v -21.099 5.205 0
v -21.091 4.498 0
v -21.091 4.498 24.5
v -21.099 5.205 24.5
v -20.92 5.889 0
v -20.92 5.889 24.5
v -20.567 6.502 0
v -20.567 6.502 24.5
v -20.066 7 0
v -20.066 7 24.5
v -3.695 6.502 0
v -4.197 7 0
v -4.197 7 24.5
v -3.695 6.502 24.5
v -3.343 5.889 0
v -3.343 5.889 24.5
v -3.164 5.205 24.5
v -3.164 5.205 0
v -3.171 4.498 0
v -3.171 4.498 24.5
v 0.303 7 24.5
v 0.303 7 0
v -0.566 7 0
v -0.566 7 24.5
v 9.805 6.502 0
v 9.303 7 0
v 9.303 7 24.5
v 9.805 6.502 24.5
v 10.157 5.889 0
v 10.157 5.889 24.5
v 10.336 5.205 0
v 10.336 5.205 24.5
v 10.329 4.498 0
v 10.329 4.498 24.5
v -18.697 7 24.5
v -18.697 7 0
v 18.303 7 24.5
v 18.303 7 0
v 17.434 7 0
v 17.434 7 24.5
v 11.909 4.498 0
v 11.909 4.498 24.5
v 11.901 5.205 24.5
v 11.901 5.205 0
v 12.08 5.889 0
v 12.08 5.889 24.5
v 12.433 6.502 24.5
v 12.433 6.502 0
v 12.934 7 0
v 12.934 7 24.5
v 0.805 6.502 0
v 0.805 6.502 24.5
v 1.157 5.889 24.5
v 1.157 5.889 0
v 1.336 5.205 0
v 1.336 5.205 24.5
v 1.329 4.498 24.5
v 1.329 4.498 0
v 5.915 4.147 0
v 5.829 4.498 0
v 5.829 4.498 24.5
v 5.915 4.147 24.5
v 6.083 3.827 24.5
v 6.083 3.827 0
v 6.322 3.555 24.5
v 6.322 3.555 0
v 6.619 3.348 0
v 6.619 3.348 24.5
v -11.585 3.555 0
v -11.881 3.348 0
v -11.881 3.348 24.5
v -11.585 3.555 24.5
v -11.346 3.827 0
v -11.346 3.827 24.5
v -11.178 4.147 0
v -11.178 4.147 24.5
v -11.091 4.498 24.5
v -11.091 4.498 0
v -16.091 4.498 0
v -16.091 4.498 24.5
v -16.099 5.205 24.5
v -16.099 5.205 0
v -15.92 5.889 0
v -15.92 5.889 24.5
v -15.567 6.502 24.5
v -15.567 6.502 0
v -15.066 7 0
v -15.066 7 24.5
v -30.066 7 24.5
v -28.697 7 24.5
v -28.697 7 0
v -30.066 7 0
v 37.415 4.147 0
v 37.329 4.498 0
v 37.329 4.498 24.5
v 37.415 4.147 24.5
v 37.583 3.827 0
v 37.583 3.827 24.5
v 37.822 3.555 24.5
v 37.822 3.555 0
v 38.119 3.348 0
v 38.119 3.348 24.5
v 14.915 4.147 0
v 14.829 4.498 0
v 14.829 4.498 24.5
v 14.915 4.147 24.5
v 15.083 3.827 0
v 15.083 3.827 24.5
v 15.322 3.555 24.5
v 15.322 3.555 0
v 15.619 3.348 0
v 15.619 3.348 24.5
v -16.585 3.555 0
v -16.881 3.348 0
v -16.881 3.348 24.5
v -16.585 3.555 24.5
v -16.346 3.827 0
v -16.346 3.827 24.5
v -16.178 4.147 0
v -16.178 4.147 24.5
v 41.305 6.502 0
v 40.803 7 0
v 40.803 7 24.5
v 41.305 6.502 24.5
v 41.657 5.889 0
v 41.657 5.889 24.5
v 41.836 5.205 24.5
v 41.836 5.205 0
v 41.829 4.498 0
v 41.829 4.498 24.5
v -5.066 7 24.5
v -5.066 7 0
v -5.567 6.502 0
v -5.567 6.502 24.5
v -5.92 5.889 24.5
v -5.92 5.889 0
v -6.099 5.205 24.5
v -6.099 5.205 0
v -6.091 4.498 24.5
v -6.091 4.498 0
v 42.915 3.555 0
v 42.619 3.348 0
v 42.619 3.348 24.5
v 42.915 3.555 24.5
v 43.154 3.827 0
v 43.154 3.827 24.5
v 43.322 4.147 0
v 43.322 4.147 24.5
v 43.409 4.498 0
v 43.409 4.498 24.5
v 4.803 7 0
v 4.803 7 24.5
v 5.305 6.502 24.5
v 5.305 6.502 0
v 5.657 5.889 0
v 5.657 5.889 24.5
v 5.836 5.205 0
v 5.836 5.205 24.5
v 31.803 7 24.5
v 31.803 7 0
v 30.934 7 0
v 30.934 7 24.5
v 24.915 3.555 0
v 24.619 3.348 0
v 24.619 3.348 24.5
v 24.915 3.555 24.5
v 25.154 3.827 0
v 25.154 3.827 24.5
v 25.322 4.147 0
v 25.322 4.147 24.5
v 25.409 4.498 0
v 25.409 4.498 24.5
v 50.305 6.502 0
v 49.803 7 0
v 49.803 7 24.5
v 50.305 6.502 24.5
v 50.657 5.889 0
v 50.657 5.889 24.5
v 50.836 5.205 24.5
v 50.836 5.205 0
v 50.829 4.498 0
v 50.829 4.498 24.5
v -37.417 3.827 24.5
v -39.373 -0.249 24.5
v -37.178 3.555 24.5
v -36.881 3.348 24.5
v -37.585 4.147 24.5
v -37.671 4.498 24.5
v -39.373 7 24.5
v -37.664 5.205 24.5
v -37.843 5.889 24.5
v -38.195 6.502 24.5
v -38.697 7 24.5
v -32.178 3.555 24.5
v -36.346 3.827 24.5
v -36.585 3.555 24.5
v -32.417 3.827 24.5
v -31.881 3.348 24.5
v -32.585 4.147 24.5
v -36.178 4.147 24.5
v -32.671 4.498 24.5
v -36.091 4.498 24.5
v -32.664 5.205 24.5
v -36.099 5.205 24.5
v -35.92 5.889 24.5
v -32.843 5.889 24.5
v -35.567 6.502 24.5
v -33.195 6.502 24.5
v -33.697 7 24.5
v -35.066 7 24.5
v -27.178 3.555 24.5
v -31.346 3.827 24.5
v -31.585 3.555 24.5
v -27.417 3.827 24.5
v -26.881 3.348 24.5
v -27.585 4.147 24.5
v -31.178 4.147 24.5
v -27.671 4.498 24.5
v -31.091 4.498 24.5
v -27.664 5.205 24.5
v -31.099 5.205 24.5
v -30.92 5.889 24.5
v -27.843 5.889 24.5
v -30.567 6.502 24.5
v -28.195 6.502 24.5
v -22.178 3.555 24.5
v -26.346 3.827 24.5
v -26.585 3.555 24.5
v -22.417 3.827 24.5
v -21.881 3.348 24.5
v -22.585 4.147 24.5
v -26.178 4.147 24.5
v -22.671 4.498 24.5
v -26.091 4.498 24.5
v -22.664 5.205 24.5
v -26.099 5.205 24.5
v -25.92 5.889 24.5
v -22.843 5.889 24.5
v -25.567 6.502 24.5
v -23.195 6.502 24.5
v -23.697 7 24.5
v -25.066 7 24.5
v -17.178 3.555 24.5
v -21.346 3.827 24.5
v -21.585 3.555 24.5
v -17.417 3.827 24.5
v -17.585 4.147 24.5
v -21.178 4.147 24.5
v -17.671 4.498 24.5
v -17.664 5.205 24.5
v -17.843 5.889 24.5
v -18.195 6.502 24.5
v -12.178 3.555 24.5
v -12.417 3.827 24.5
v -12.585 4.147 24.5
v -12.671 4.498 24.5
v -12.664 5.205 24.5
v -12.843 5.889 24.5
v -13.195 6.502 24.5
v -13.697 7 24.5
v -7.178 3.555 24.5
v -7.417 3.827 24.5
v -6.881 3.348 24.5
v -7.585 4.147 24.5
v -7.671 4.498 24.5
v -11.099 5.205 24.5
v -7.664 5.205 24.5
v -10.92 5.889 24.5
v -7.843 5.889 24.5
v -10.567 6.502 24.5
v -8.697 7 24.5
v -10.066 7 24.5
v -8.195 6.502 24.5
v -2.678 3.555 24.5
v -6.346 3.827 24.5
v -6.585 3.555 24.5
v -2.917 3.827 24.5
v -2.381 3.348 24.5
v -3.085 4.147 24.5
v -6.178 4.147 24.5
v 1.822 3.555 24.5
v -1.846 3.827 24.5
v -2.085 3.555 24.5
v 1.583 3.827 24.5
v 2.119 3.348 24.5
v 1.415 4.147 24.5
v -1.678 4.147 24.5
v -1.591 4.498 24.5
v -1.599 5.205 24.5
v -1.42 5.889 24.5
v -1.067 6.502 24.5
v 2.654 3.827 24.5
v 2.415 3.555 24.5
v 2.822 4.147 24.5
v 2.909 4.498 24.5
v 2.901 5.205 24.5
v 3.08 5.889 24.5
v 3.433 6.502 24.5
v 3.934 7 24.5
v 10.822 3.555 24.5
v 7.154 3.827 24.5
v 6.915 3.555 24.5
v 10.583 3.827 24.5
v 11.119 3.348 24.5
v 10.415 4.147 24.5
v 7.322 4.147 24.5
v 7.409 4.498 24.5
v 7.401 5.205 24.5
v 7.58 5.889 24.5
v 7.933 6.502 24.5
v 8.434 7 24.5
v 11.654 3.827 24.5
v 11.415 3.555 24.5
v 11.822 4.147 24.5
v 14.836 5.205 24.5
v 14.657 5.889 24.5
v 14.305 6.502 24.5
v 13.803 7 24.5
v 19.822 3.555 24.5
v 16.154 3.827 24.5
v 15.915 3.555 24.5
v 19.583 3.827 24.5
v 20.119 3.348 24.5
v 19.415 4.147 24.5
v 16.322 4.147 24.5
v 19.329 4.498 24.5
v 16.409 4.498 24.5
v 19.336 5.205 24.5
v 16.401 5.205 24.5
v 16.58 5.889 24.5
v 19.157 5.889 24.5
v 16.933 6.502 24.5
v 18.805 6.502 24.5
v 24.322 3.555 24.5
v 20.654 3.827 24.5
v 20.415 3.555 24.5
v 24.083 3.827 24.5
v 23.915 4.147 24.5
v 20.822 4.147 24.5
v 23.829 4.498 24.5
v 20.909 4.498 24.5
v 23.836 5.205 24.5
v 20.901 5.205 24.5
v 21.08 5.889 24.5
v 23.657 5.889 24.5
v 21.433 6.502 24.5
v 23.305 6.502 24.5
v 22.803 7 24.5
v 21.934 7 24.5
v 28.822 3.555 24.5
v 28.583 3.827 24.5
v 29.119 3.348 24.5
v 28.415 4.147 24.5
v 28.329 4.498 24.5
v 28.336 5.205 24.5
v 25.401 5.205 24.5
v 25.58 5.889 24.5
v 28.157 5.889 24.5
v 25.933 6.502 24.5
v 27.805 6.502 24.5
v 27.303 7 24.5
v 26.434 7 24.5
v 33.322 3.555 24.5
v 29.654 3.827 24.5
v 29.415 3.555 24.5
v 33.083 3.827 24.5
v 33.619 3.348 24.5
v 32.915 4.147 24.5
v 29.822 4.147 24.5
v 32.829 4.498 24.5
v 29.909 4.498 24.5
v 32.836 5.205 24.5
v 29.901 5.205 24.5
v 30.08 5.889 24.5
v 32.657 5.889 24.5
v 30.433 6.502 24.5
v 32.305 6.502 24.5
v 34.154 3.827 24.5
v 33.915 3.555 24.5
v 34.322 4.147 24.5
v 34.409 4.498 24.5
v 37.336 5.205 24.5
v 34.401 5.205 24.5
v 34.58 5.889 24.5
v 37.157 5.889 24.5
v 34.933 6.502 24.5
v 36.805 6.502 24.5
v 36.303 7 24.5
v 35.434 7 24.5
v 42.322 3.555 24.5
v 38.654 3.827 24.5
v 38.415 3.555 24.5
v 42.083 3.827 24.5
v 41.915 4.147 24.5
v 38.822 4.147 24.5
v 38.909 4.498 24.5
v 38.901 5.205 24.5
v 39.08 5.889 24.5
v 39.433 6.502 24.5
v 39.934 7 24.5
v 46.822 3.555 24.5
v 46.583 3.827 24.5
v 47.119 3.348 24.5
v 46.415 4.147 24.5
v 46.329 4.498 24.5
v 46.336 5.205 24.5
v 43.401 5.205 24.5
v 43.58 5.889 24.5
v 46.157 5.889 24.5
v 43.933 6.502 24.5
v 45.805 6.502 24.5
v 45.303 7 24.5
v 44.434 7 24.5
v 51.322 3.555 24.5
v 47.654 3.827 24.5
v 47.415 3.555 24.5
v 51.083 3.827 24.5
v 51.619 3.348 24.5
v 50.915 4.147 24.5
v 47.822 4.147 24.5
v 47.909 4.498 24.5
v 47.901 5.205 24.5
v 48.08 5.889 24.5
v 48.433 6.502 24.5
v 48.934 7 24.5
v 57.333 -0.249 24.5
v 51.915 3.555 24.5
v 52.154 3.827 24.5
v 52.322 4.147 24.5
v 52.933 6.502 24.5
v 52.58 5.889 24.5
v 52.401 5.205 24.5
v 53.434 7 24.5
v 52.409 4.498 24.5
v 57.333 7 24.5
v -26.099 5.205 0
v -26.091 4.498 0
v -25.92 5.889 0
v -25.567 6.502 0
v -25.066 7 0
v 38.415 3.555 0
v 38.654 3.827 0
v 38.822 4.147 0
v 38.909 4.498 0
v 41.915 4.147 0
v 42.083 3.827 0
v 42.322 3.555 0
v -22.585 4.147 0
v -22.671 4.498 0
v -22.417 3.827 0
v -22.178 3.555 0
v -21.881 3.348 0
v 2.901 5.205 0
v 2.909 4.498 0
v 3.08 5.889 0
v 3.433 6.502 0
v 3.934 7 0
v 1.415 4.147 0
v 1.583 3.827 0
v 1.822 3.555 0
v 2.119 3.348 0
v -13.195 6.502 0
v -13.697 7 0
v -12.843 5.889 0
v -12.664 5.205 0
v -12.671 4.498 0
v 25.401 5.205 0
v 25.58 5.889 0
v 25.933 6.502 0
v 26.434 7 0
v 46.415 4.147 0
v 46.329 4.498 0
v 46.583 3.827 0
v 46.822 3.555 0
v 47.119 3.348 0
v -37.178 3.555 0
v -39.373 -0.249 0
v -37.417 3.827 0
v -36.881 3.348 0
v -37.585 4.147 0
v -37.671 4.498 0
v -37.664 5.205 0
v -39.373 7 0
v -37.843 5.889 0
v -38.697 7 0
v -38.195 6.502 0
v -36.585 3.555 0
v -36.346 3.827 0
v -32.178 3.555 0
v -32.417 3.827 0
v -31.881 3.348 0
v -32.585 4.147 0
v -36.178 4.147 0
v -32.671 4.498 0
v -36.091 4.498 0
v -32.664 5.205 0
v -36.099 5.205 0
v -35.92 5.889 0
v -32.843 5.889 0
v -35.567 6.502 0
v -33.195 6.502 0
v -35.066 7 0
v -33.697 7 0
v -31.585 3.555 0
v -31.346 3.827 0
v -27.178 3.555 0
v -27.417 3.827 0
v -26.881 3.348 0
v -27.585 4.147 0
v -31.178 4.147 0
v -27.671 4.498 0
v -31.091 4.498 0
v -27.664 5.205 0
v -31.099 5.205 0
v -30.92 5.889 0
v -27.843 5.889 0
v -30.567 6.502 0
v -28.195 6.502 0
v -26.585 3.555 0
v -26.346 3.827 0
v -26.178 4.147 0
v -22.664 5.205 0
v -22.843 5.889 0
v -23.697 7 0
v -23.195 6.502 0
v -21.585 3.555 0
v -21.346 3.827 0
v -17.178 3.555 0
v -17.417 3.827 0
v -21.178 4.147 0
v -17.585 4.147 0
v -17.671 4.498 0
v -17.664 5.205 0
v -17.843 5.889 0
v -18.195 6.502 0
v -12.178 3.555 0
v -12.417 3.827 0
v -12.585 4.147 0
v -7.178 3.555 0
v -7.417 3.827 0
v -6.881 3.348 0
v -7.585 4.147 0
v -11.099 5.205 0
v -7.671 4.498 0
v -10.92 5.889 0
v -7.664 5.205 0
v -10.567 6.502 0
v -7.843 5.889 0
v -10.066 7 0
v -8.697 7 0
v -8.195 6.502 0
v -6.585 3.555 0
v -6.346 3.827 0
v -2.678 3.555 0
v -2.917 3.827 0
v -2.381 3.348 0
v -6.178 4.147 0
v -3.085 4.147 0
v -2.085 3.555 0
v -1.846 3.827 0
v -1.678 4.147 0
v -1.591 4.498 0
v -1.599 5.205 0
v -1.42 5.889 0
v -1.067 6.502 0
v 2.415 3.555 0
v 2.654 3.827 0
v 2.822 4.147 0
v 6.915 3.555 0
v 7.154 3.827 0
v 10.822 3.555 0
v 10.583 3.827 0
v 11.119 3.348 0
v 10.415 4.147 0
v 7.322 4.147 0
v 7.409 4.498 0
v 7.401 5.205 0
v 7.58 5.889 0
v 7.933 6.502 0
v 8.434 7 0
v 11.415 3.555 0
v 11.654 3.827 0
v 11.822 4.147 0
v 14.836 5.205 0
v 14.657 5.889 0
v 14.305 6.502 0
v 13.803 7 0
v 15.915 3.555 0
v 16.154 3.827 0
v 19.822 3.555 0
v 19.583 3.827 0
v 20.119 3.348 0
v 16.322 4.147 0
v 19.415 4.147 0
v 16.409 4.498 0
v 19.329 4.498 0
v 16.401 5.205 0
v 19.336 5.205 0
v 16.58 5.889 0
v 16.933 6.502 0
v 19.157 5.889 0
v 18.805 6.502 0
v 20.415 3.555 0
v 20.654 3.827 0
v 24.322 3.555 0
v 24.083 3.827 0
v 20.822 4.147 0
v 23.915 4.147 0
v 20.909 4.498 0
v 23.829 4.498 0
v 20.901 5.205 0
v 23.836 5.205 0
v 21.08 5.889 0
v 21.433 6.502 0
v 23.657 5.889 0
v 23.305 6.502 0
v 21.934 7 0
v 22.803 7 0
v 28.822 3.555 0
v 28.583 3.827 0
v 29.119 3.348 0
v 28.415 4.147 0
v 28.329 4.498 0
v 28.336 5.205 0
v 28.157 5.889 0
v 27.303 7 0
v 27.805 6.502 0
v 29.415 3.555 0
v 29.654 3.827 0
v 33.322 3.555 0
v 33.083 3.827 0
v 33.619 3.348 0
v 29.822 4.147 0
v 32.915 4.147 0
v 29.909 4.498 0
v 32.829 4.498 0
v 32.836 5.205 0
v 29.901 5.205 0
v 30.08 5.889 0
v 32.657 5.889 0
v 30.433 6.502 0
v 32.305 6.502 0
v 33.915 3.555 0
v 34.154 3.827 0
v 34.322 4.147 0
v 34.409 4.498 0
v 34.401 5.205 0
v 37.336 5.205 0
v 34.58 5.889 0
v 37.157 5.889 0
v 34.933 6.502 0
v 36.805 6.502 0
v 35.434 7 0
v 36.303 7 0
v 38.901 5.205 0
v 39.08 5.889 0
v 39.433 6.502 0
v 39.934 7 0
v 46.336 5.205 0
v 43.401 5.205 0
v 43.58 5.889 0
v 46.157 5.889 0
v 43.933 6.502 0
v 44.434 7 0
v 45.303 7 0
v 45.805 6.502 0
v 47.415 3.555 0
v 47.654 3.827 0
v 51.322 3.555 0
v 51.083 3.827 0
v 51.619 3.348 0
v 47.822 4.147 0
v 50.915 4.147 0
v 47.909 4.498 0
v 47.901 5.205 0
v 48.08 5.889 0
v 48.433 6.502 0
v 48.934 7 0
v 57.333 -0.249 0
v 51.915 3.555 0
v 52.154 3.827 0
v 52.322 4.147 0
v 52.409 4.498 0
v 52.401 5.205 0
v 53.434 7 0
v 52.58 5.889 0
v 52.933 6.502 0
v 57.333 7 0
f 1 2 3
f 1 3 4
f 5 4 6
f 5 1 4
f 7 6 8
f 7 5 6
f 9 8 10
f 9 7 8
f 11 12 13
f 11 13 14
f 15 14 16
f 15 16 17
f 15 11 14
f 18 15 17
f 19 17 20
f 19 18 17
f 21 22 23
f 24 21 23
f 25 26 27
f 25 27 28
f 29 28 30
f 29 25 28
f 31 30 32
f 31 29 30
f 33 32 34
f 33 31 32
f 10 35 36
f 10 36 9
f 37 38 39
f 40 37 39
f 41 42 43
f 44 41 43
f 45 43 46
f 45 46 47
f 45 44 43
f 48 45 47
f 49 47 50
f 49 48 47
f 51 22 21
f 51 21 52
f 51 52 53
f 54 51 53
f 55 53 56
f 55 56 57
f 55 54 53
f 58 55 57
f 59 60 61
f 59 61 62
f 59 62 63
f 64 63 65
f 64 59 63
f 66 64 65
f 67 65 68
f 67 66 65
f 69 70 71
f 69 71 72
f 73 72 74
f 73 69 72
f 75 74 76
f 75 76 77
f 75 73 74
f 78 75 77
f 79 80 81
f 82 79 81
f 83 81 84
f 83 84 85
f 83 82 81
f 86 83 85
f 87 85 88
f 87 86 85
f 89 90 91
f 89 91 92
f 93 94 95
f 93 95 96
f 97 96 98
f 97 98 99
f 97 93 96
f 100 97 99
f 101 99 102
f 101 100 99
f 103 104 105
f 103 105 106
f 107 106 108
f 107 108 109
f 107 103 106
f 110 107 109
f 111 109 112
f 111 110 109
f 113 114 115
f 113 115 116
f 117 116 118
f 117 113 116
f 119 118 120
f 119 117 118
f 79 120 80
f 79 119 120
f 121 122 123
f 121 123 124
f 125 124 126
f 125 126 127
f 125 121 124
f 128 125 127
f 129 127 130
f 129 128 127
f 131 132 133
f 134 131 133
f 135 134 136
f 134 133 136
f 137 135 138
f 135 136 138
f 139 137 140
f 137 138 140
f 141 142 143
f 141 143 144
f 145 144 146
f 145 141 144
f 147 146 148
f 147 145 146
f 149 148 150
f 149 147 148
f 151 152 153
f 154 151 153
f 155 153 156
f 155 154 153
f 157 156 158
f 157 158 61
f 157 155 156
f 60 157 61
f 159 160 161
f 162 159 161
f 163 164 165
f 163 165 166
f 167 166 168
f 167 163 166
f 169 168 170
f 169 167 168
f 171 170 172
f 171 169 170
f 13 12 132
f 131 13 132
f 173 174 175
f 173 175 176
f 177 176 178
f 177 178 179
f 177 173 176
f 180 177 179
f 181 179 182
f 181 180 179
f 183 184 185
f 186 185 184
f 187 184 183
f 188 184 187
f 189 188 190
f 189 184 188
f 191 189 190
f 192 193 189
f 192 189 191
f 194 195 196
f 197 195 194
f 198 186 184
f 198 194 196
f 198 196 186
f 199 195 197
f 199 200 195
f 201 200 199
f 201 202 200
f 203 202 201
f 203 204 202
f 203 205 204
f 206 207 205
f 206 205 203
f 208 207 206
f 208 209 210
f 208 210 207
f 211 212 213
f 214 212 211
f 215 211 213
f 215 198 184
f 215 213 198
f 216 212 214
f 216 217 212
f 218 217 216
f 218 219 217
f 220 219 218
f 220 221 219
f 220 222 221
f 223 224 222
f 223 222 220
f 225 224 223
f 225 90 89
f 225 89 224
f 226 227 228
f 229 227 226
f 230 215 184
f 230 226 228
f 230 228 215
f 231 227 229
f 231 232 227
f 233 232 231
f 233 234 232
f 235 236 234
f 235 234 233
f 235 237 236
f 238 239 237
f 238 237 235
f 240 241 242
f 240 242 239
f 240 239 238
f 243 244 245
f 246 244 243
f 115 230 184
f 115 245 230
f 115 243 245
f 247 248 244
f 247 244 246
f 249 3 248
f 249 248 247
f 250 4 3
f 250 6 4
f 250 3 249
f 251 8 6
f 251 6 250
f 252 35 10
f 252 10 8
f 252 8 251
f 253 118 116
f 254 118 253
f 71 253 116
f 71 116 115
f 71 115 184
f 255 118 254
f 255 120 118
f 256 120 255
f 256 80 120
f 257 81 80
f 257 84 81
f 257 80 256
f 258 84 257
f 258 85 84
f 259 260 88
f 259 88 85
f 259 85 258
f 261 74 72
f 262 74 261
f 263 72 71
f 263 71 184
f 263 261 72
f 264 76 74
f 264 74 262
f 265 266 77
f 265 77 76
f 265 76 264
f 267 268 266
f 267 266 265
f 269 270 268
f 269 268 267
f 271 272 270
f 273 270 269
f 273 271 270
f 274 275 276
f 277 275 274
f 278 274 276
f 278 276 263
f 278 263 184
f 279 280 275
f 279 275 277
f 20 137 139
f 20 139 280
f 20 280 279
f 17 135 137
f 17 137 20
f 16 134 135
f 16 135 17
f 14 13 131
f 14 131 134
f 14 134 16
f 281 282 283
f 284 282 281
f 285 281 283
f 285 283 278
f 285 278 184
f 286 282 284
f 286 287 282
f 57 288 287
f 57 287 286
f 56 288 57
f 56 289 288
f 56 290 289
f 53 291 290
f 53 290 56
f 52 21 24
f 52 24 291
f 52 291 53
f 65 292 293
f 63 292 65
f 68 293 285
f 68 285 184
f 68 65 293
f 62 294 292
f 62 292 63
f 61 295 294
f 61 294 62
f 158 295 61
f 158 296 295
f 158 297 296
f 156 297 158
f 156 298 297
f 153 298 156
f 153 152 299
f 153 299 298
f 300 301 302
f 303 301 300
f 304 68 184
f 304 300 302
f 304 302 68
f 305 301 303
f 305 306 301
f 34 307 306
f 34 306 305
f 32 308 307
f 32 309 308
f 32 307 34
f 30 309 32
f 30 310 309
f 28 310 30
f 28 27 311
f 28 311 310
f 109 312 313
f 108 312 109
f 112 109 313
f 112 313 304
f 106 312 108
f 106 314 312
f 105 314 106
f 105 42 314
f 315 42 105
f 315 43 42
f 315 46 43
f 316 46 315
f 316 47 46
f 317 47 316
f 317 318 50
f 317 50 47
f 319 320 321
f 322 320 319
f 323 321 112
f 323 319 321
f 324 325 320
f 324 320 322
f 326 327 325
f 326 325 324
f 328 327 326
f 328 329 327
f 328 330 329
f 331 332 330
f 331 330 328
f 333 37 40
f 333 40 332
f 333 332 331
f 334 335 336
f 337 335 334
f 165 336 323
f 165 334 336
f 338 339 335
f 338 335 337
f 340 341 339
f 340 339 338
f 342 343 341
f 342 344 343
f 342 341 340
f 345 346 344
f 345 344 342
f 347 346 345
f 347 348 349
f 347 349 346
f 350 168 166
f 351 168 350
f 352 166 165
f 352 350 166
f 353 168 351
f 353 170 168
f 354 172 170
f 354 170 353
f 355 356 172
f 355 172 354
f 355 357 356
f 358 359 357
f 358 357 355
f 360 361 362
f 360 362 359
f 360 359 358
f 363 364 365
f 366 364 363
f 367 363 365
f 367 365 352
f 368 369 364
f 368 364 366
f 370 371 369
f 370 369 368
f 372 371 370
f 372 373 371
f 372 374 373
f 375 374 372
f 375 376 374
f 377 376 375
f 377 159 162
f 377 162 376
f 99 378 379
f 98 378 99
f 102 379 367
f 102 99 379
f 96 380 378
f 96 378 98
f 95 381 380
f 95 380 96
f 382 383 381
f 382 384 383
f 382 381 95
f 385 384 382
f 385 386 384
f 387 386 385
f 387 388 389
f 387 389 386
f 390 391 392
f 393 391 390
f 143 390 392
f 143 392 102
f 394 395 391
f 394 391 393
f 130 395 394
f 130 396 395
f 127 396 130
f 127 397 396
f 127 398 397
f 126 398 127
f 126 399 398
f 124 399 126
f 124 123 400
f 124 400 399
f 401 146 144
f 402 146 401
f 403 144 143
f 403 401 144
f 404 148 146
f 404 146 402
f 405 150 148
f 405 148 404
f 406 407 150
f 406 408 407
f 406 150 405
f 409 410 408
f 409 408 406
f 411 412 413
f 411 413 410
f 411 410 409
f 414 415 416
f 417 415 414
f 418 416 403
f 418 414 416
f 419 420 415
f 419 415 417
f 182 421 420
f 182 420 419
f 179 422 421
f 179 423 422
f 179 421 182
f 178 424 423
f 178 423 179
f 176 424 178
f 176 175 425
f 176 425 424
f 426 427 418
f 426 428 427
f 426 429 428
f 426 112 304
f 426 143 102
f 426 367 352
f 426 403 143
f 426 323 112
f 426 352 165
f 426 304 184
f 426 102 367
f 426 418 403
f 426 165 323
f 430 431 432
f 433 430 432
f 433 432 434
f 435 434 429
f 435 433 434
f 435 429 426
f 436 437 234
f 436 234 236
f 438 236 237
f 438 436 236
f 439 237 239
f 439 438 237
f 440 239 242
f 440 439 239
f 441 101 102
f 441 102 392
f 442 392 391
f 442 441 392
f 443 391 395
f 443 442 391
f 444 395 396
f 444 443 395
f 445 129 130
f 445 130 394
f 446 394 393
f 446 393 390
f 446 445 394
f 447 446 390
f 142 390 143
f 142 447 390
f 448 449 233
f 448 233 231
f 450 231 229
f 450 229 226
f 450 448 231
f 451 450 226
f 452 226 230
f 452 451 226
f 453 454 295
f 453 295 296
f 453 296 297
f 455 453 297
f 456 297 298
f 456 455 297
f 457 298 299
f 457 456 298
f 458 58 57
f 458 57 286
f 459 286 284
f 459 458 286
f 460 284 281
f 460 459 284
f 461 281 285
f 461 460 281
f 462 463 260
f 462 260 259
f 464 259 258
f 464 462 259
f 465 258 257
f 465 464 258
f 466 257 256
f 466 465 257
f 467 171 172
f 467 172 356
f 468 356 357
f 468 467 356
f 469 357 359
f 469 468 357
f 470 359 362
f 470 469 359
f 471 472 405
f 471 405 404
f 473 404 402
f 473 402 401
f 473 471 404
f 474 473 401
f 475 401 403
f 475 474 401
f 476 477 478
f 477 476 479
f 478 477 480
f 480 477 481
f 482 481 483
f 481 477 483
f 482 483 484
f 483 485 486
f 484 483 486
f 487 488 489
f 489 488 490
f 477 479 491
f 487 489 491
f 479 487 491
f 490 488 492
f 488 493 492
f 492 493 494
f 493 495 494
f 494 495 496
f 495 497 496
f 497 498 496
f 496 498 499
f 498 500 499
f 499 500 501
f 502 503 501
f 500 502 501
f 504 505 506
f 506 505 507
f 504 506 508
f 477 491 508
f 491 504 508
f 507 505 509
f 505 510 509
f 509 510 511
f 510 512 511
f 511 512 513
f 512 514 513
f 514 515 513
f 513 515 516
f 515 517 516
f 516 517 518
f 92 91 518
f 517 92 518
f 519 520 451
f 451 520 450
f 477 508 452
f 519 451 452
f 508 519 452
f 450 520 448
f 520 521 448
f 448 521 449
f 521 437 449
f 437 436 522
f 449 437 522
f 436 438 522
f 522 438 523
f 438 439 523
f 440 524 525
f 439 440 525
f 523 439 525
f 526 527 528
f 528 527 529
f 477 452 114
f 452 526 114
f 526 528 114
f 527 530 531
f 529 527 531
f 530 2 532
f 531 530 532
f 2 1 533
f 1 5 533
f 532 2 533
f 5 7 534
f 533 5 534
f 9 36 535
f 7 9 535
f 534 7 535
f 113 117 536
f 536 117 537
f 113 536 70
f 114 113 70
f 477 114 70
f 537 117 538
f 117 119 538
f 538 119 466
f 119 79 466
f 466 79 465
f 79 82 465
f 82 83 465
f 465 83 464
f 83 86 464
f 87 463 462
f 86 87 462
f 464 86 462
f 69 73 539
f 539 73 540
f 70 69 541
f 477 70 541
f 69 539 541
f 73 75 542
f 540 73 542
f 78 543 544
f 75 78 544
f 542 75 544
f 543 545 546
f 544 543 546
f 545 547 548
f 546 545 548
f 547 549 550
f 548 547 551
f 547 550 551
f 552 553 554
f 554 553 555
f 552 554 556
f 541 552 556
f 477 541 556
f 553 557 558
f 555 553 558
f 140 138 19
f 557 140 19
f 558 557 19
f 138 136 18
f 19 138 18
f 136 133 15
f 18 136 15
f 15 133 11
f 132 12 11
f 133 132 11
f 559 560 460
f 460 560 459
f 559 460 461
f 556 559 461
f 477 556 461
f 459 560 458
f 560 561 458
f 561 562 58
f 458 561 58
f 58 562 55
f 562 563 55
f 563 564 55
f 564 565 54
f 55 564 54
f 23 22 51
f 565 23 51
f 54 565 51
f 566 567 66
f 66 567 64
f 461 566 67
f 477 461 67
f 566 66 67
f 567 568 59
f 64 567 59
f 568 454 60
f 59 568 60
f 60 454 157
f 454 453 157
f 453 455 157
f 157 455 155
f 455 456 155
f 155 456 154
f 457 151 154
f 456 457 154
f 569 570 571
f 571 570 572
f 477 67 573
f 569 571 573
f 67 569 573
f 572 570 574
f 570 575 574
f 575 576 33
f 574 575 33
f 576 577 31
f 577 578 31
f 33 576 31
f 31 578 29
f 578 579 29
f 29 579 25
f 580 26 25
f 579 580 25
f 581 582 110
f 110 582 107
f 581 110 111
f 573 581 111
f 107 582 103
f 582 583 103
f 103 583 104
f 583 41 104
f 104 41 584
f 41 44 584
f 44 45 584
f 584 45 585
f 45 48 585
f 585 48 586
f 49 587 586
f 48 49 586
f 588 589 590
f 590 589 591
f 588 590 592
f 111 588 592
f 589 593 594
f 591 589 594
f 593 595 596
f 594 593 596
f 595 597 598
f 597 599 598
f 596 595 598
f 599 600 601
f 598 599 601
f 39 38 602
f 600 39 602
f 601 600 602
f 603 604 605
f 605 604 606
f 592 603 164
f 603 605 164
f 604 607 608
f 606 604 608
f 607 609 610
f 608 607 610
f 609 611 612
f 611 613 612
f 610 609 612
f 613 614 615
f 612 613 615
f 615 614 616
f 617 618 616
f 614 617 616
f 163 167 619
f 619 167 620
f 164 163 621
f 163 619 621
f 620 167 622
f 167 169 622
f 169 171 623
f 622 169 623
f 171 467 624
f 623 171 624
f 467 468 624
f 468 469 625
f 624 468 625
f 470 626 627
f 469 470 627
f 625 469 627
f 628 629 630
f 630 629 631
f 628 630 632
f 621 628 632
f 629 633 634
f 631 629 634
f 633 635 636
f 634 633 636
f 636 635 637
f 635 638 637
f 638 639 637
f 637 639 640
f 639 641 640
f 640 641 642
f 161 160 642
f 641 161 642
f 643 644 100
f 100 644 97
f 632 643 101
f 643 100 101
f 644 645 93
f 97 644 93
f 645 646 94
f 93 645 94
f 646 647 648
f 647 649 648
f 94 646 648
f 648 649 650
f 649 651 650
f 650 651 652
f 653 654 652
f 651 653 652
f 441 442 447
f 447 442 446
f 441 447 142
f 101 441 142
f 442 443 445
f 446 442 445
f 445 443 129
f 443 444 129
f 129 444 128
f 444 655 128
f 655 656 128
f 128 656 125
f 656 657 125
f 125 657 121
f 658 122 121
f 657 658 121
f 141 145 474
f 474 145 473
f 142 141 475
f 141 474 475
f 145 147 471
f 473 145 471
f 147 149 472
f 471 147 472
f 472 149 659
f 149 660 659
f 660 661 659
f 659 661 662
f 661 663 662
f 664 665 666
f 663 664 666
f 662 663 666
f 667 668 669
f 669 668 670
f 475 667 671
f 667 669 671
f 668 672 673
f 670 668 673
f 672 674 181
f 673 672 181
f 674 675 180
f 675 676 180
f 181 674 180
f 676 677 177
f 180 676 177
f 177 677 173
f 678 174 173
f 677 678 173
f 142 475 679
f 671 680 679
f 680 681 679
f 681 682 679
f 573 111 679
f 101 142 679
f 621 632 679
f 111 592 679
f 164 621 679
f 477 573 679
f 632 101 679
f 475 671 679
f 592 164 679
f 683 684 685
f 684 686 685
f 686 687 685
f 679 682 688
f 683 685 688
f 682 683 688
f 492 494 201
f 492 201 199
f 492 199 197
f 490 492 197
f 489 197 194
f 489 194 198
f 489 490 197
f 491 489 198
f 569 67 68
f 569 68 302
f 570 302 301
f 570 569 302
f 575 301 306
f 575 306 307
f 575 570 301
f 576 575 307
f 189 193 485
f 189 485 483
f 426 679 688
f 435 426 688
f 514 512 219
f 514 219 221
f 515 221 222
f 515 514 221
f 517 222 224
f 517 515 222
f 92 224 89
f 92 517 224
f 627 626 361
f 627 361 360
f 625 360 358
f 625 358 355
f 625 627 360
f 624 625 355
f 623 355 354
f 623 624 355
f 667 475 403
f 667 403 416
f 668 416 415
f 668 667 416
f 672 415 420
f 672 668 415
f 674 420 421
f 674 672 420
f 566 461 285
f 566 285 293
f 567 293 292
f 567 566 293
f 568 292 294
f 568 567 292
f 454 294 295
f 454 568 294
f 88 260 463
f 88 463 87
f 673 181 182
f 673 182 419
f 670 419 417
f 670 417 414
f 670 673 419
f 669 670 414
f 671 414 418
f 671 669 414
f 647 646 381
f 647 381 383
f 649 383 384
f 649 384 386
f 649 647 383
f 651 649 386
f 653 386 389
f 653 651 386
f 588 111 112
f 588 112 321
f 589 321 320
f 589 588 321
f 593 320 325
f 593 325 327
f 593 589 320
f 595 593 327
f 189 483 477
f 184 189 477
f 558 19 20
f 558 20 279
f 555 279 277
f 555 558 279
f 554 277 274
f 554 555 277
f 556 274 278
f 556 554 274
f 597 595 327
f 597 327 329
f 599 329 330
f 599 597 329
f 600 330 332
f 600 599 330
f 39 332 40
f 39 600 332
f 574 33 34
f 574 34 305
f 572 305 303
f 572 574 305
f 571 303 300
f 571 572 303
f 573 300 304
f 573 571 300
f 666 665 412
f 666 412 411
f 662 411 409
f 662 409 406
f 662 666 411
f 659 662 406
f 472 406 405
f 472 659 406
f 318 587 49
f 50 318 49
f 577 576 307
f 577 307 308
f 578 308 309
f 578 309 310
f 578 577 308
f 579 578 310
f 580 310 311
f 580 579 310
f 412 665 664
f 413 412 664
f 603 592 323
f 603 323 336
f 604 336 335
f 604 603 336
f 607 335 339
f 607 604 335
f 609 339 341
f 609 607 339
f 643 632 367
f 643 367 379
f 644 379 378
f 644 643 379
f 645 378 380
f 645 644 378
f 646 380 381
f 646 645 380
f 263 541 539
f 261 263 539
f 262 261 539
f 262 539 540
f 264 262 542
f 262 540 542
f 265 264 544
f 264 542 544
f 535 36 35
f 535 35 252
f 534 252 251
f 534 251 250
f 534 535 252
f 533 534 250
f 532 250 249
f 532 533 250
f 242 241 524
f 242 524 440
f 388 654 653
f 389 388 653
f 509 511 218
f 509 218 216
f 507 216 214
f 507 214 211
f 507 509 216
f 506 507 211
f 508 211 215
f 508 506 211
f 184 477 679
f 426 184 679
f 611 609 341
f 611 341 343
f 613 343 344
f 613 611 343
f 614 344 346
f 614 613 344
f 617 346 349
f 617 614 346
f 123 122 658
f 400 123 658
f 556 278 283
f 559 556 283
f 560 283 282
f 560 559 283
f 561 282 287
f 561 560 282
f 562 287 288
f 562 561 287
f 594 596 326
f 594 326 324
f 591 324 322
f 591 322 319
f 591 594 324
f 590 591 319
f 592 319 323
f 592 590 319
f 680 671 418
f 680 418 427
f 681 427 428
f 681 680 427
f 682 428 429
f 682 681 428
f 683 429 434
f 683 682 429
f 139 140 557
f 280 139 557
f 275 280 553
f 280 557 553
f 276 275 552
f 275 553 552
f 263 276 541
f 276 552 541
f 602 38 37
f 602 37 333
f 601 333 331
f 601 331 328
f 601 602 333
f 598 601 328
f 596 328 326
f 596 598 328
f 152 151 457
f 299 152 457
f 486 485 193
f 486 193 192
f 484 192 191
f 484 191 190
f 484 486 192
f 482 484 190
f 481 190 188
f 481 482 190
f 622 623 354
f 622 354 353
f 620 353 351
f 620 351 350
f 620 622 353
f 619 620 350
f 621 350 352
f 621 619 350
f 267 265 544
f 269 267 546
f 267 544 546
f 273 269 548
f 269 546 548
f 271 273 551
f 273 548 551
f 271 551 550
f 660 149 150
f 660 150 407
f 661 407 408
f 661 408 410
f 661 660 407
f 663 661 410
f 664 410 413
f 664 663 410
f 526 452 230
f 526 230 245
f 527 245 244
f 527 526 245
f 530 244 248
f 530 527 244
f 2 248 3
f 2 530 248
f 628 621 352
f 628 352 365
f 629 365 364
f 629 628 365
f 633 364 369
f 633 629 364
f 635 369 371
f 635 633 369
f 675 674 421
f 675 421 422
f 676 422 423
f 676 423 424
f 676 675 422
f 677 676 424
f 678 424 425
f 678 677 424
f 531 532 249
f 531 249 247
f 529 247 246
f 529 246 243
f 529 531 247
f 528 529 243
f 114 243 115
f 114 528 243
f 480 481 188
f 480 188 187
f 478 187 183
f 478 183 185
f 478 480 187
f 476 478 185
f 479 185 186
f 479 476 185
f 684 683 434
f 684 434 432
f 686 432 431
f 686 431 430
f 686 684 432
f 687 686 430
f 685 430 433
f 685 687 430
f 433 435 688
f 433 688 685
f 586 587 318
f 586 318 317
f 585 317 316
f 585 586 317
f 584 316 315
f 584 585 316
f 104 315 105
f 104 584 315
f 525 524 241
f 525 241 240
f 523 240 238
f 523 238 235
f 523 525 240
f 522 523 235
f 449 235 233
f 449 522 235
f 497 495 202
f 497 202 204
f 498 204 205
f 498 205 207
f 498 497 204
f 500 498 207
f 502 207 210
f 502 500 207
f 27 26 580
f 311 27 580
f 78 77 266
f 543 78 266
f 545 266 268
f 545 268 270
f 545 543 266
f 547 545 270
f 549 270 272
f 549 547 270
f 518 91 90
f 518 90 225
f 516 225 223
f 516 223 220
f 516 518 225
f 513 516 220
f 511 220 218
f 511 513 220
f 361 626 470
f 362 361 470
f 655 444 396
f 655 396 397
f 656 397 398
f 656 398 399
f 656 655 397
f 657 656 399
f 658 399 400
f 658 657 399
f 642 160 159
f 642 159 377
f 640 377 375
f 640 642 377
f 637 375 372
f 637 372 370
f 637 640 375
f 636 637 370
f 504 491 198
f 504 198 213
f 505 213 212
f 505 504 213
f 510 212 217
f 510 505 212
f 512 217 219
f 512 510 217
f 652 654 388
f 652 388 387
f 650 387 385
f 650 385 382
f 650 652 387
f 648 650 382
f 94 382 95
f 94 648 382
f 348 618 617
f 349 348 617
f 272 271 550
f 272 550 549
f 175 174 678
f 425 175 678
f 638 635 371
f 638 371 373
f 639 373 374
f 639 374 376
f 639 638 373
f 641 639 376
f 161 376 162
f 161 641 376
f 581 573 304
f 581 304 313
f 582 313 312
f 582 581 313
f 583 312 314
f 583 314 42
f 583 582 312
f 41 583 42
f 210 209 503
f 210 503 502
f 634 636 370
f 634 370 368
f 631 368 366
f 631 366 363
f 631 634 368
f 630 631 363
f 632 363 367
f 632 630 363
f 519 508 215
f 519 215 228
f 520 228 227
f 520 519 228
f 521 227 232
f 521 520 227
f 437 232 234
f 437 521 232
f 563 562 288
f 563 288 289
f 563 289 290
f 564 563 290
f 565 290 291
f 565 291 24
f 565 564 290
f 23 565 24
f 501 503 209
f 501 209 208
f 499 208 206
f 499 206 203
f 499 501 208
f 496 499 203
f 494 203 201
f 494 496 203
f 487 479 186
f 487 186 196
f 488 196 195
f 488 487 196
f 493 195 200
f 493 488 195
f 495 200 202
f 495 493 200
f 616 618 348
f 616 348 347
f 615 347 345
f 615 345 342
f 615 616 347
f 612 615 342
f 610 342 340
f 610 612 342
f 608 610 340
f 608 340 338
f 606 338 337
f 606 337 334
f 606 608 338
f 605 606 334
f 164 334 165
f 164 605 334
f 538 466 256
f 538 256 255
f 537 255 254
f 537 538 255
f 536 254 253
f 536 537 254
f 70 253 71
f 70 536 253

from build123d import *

# Parameters (mm, degrees)
BOSS_EXTRUDE1_DEPTH = 24.5
CUT_EXTRUDE1_DEPTH  = 26.12
LPATTERN1_COUNT     = 10
LPATTERN1_PITCH     = 5
LPATTERN1_COL_COUNT = 14
LPATTERN1_COL_PITCH = 4.5


with BuildPart() as part:
    # Sketch1 → Boss-Extrude1 (new body)
    with BuildSketch(Plane.XY):
        Polygon((28.000000003, 7), (-39.373173928, 7), (-39.373173928, -0.249149017), (0.939234275, -0.249149017), (57.333339072, -0.249149017), (57.333339072, 7), align=None)
    extrude(amount=BOSS_EXTRUDE1_DEPTH)

    # Sketch2 → Cut-Extrude1 (cut)
    with BuildSketch(Plane.XY):
        with BuildLine():
            ThreePointArc((-6.881285782, 3.348371163), (-7.417069895, 3.826658598), (-7.671285782, 4.498371163))
            ThreePointArc((-7.671285782, 4.498371163), (-7.912320341, 6.04482582), (-8.981285782, 7.188037328))
            ThreePointArc((-8.981285782, 7.188037328), (-6.881285782, 7.762283268), (-4.781285782, 7.188037328))
            ThreePointArc((-4.781285782, 7.188037328), (-5.850251222, 6.04482582), (-6.091285782, 4.498371163))
            ThreePointArc((-6.091285782, 4.498371163), (-6.345501668, 3.826658598), (-6.881285782, 3.348371163))
        make_face()
    cut_extrude1 = extrude(amount=CUT_EXTRUDE1_DEPTH, mode=Mode.SUBTRACT)

    # LPattern1: Cut-Extrude1 ×10
    with Locations(*[(-i * LPATTERN1_PITCH, 0, 0) for i in range(1, LPATTERN1_COUNT)]):
        add(cut_extrude1, mode=Mode.SUBTRACT)

    # LPattern1 col: Cut-Extrude1 ×14
    with Locations(*[(i * LPATTERN1_COL_PITCH, 0, 0) for i in range(1, LPATTERN1_COL_COUNT)]):
        add(cut_extrude1, mode=Mode.SUBTRACT)


solid = part.part
